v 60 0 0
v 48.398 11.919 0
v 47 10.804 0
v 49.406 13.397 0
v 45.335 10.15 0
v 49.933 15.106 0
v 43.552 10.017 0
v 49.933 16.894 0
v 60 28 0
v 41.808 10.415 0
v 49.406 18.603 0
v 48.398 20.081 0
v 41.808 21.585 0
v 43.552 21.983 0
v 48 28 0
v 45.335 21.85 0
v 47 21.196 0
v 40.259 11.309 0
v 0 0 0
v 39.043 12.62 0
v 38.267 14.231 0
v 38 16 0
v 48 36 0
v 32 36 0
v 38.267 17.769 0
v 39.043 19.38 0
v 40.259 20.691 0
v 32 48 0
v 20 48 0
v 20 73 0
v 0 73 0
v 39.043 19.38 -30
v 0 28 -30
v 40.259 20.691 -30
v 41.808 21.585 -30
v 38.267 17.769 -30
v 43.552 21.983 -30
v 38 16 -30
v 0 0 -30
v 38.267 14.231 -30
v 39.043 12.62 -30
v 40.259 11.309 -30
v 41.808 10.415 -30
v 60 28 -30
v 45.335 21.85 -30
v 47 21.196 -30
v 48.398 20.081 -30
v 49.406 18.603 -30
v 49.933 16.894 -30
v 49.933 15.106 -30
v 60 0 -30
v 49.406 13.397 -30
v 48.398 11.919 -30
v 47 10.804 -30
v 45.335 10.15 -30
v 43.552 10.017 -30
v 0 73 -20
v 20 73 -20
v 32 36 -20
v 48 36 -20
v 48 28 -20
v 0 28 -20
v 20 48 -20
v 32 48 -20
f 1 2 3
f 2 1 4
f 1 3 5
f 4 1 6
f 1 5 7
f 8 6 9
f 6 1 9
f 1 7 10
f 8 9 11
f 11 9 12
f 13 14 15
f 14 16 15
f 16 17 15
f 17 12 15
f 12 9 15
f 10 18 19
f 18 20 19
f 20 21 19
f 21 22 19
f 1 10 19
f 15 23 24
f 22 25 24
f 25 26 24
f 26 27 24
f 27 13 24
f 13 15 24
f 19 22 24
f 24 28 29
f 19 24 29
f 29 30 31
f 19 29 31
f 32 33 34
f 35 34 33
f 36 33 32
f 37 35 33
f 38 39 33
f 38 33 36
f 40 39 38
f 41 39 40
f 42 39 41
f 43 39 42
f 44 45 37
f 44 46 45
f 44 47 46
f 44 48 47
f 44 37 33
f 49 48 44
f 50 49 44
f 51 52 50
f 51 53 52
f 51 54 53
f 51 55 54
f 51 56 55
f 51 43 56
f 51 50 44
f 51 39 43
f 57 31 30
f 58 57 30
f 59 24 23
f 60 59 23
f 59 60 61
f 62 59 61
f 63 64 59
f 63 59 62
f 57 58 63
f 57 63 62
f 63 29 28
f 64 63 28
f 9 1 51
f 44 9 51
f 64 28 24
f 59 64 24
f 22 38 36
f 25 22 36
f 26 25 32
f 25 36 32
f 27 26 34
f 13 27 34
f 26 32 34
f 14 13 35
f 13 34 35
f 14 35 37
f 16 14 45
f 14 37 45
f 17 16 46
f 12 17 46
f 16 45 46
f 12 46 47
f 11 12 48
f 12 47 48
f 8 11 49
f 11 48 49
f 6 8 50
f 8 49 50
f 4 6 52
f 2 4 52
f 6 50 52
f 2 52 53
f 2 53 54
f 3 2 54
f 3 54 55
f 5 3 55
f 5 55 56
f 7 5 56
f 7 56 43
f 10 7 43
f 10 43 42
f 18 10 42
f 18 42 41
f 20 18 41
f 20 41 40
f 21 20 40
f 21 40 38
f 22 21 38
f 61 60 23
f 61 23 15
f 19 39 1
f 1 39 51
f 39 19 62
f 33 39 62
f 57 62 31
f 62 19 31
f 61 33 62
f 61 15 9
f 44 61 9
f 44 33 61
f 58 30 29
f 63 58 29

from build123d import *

# Parameters (mm, degrees)
SKETCH2_W           = 60
SKETCH2_H           = 30
BOSS_EXTRUDE1_DEPTH = 28
BOSS_EXTRUDE3_DEPTH = 20
SKETCH6_R           = 6
CUT_EXTRUDE7_DEPTH  = 60


with BuildPart() as part:
    # Sketch2 → Boss-Extrude1 (new body)
    with BuildSketch(Plane(origin=(0, 0, 0), x_dir=(1, 0, 0), z_dir=(0, 1, 0))):
        with Locations((30, 15)):
            Rectangle(SKETCH2_W, SKETCH2_H)
    extrude(amount=BOSS_EXTRUDE1_DEPTH)

    # Sketch3 → Boss-Extrude3 (add)
    with BuildSketch(Plane.XY):
        Polygon((0, 28), (0, 73), (20, 73), (20, 48), (32, 48), (32, 36), (48, 36), (48, 28), align=None)
    extrude(amount=-BOSS_EXTRUDE3_DEPTH)

    # Sketch6 → Cut-Extrude7 (cut)
    with BuildSketch(Plane(origin=(0, 0, -30), x_dir=(-1, 0, 0), z_dir=(0, 0, -1))):
        with Locations((-44, 16)):
            Circle(SKETCH6_R)
    extrude(amount=-CUT_EXTRUDE7_DEPTH, mode=Mode.SUBTRACT)


solid = part.part
